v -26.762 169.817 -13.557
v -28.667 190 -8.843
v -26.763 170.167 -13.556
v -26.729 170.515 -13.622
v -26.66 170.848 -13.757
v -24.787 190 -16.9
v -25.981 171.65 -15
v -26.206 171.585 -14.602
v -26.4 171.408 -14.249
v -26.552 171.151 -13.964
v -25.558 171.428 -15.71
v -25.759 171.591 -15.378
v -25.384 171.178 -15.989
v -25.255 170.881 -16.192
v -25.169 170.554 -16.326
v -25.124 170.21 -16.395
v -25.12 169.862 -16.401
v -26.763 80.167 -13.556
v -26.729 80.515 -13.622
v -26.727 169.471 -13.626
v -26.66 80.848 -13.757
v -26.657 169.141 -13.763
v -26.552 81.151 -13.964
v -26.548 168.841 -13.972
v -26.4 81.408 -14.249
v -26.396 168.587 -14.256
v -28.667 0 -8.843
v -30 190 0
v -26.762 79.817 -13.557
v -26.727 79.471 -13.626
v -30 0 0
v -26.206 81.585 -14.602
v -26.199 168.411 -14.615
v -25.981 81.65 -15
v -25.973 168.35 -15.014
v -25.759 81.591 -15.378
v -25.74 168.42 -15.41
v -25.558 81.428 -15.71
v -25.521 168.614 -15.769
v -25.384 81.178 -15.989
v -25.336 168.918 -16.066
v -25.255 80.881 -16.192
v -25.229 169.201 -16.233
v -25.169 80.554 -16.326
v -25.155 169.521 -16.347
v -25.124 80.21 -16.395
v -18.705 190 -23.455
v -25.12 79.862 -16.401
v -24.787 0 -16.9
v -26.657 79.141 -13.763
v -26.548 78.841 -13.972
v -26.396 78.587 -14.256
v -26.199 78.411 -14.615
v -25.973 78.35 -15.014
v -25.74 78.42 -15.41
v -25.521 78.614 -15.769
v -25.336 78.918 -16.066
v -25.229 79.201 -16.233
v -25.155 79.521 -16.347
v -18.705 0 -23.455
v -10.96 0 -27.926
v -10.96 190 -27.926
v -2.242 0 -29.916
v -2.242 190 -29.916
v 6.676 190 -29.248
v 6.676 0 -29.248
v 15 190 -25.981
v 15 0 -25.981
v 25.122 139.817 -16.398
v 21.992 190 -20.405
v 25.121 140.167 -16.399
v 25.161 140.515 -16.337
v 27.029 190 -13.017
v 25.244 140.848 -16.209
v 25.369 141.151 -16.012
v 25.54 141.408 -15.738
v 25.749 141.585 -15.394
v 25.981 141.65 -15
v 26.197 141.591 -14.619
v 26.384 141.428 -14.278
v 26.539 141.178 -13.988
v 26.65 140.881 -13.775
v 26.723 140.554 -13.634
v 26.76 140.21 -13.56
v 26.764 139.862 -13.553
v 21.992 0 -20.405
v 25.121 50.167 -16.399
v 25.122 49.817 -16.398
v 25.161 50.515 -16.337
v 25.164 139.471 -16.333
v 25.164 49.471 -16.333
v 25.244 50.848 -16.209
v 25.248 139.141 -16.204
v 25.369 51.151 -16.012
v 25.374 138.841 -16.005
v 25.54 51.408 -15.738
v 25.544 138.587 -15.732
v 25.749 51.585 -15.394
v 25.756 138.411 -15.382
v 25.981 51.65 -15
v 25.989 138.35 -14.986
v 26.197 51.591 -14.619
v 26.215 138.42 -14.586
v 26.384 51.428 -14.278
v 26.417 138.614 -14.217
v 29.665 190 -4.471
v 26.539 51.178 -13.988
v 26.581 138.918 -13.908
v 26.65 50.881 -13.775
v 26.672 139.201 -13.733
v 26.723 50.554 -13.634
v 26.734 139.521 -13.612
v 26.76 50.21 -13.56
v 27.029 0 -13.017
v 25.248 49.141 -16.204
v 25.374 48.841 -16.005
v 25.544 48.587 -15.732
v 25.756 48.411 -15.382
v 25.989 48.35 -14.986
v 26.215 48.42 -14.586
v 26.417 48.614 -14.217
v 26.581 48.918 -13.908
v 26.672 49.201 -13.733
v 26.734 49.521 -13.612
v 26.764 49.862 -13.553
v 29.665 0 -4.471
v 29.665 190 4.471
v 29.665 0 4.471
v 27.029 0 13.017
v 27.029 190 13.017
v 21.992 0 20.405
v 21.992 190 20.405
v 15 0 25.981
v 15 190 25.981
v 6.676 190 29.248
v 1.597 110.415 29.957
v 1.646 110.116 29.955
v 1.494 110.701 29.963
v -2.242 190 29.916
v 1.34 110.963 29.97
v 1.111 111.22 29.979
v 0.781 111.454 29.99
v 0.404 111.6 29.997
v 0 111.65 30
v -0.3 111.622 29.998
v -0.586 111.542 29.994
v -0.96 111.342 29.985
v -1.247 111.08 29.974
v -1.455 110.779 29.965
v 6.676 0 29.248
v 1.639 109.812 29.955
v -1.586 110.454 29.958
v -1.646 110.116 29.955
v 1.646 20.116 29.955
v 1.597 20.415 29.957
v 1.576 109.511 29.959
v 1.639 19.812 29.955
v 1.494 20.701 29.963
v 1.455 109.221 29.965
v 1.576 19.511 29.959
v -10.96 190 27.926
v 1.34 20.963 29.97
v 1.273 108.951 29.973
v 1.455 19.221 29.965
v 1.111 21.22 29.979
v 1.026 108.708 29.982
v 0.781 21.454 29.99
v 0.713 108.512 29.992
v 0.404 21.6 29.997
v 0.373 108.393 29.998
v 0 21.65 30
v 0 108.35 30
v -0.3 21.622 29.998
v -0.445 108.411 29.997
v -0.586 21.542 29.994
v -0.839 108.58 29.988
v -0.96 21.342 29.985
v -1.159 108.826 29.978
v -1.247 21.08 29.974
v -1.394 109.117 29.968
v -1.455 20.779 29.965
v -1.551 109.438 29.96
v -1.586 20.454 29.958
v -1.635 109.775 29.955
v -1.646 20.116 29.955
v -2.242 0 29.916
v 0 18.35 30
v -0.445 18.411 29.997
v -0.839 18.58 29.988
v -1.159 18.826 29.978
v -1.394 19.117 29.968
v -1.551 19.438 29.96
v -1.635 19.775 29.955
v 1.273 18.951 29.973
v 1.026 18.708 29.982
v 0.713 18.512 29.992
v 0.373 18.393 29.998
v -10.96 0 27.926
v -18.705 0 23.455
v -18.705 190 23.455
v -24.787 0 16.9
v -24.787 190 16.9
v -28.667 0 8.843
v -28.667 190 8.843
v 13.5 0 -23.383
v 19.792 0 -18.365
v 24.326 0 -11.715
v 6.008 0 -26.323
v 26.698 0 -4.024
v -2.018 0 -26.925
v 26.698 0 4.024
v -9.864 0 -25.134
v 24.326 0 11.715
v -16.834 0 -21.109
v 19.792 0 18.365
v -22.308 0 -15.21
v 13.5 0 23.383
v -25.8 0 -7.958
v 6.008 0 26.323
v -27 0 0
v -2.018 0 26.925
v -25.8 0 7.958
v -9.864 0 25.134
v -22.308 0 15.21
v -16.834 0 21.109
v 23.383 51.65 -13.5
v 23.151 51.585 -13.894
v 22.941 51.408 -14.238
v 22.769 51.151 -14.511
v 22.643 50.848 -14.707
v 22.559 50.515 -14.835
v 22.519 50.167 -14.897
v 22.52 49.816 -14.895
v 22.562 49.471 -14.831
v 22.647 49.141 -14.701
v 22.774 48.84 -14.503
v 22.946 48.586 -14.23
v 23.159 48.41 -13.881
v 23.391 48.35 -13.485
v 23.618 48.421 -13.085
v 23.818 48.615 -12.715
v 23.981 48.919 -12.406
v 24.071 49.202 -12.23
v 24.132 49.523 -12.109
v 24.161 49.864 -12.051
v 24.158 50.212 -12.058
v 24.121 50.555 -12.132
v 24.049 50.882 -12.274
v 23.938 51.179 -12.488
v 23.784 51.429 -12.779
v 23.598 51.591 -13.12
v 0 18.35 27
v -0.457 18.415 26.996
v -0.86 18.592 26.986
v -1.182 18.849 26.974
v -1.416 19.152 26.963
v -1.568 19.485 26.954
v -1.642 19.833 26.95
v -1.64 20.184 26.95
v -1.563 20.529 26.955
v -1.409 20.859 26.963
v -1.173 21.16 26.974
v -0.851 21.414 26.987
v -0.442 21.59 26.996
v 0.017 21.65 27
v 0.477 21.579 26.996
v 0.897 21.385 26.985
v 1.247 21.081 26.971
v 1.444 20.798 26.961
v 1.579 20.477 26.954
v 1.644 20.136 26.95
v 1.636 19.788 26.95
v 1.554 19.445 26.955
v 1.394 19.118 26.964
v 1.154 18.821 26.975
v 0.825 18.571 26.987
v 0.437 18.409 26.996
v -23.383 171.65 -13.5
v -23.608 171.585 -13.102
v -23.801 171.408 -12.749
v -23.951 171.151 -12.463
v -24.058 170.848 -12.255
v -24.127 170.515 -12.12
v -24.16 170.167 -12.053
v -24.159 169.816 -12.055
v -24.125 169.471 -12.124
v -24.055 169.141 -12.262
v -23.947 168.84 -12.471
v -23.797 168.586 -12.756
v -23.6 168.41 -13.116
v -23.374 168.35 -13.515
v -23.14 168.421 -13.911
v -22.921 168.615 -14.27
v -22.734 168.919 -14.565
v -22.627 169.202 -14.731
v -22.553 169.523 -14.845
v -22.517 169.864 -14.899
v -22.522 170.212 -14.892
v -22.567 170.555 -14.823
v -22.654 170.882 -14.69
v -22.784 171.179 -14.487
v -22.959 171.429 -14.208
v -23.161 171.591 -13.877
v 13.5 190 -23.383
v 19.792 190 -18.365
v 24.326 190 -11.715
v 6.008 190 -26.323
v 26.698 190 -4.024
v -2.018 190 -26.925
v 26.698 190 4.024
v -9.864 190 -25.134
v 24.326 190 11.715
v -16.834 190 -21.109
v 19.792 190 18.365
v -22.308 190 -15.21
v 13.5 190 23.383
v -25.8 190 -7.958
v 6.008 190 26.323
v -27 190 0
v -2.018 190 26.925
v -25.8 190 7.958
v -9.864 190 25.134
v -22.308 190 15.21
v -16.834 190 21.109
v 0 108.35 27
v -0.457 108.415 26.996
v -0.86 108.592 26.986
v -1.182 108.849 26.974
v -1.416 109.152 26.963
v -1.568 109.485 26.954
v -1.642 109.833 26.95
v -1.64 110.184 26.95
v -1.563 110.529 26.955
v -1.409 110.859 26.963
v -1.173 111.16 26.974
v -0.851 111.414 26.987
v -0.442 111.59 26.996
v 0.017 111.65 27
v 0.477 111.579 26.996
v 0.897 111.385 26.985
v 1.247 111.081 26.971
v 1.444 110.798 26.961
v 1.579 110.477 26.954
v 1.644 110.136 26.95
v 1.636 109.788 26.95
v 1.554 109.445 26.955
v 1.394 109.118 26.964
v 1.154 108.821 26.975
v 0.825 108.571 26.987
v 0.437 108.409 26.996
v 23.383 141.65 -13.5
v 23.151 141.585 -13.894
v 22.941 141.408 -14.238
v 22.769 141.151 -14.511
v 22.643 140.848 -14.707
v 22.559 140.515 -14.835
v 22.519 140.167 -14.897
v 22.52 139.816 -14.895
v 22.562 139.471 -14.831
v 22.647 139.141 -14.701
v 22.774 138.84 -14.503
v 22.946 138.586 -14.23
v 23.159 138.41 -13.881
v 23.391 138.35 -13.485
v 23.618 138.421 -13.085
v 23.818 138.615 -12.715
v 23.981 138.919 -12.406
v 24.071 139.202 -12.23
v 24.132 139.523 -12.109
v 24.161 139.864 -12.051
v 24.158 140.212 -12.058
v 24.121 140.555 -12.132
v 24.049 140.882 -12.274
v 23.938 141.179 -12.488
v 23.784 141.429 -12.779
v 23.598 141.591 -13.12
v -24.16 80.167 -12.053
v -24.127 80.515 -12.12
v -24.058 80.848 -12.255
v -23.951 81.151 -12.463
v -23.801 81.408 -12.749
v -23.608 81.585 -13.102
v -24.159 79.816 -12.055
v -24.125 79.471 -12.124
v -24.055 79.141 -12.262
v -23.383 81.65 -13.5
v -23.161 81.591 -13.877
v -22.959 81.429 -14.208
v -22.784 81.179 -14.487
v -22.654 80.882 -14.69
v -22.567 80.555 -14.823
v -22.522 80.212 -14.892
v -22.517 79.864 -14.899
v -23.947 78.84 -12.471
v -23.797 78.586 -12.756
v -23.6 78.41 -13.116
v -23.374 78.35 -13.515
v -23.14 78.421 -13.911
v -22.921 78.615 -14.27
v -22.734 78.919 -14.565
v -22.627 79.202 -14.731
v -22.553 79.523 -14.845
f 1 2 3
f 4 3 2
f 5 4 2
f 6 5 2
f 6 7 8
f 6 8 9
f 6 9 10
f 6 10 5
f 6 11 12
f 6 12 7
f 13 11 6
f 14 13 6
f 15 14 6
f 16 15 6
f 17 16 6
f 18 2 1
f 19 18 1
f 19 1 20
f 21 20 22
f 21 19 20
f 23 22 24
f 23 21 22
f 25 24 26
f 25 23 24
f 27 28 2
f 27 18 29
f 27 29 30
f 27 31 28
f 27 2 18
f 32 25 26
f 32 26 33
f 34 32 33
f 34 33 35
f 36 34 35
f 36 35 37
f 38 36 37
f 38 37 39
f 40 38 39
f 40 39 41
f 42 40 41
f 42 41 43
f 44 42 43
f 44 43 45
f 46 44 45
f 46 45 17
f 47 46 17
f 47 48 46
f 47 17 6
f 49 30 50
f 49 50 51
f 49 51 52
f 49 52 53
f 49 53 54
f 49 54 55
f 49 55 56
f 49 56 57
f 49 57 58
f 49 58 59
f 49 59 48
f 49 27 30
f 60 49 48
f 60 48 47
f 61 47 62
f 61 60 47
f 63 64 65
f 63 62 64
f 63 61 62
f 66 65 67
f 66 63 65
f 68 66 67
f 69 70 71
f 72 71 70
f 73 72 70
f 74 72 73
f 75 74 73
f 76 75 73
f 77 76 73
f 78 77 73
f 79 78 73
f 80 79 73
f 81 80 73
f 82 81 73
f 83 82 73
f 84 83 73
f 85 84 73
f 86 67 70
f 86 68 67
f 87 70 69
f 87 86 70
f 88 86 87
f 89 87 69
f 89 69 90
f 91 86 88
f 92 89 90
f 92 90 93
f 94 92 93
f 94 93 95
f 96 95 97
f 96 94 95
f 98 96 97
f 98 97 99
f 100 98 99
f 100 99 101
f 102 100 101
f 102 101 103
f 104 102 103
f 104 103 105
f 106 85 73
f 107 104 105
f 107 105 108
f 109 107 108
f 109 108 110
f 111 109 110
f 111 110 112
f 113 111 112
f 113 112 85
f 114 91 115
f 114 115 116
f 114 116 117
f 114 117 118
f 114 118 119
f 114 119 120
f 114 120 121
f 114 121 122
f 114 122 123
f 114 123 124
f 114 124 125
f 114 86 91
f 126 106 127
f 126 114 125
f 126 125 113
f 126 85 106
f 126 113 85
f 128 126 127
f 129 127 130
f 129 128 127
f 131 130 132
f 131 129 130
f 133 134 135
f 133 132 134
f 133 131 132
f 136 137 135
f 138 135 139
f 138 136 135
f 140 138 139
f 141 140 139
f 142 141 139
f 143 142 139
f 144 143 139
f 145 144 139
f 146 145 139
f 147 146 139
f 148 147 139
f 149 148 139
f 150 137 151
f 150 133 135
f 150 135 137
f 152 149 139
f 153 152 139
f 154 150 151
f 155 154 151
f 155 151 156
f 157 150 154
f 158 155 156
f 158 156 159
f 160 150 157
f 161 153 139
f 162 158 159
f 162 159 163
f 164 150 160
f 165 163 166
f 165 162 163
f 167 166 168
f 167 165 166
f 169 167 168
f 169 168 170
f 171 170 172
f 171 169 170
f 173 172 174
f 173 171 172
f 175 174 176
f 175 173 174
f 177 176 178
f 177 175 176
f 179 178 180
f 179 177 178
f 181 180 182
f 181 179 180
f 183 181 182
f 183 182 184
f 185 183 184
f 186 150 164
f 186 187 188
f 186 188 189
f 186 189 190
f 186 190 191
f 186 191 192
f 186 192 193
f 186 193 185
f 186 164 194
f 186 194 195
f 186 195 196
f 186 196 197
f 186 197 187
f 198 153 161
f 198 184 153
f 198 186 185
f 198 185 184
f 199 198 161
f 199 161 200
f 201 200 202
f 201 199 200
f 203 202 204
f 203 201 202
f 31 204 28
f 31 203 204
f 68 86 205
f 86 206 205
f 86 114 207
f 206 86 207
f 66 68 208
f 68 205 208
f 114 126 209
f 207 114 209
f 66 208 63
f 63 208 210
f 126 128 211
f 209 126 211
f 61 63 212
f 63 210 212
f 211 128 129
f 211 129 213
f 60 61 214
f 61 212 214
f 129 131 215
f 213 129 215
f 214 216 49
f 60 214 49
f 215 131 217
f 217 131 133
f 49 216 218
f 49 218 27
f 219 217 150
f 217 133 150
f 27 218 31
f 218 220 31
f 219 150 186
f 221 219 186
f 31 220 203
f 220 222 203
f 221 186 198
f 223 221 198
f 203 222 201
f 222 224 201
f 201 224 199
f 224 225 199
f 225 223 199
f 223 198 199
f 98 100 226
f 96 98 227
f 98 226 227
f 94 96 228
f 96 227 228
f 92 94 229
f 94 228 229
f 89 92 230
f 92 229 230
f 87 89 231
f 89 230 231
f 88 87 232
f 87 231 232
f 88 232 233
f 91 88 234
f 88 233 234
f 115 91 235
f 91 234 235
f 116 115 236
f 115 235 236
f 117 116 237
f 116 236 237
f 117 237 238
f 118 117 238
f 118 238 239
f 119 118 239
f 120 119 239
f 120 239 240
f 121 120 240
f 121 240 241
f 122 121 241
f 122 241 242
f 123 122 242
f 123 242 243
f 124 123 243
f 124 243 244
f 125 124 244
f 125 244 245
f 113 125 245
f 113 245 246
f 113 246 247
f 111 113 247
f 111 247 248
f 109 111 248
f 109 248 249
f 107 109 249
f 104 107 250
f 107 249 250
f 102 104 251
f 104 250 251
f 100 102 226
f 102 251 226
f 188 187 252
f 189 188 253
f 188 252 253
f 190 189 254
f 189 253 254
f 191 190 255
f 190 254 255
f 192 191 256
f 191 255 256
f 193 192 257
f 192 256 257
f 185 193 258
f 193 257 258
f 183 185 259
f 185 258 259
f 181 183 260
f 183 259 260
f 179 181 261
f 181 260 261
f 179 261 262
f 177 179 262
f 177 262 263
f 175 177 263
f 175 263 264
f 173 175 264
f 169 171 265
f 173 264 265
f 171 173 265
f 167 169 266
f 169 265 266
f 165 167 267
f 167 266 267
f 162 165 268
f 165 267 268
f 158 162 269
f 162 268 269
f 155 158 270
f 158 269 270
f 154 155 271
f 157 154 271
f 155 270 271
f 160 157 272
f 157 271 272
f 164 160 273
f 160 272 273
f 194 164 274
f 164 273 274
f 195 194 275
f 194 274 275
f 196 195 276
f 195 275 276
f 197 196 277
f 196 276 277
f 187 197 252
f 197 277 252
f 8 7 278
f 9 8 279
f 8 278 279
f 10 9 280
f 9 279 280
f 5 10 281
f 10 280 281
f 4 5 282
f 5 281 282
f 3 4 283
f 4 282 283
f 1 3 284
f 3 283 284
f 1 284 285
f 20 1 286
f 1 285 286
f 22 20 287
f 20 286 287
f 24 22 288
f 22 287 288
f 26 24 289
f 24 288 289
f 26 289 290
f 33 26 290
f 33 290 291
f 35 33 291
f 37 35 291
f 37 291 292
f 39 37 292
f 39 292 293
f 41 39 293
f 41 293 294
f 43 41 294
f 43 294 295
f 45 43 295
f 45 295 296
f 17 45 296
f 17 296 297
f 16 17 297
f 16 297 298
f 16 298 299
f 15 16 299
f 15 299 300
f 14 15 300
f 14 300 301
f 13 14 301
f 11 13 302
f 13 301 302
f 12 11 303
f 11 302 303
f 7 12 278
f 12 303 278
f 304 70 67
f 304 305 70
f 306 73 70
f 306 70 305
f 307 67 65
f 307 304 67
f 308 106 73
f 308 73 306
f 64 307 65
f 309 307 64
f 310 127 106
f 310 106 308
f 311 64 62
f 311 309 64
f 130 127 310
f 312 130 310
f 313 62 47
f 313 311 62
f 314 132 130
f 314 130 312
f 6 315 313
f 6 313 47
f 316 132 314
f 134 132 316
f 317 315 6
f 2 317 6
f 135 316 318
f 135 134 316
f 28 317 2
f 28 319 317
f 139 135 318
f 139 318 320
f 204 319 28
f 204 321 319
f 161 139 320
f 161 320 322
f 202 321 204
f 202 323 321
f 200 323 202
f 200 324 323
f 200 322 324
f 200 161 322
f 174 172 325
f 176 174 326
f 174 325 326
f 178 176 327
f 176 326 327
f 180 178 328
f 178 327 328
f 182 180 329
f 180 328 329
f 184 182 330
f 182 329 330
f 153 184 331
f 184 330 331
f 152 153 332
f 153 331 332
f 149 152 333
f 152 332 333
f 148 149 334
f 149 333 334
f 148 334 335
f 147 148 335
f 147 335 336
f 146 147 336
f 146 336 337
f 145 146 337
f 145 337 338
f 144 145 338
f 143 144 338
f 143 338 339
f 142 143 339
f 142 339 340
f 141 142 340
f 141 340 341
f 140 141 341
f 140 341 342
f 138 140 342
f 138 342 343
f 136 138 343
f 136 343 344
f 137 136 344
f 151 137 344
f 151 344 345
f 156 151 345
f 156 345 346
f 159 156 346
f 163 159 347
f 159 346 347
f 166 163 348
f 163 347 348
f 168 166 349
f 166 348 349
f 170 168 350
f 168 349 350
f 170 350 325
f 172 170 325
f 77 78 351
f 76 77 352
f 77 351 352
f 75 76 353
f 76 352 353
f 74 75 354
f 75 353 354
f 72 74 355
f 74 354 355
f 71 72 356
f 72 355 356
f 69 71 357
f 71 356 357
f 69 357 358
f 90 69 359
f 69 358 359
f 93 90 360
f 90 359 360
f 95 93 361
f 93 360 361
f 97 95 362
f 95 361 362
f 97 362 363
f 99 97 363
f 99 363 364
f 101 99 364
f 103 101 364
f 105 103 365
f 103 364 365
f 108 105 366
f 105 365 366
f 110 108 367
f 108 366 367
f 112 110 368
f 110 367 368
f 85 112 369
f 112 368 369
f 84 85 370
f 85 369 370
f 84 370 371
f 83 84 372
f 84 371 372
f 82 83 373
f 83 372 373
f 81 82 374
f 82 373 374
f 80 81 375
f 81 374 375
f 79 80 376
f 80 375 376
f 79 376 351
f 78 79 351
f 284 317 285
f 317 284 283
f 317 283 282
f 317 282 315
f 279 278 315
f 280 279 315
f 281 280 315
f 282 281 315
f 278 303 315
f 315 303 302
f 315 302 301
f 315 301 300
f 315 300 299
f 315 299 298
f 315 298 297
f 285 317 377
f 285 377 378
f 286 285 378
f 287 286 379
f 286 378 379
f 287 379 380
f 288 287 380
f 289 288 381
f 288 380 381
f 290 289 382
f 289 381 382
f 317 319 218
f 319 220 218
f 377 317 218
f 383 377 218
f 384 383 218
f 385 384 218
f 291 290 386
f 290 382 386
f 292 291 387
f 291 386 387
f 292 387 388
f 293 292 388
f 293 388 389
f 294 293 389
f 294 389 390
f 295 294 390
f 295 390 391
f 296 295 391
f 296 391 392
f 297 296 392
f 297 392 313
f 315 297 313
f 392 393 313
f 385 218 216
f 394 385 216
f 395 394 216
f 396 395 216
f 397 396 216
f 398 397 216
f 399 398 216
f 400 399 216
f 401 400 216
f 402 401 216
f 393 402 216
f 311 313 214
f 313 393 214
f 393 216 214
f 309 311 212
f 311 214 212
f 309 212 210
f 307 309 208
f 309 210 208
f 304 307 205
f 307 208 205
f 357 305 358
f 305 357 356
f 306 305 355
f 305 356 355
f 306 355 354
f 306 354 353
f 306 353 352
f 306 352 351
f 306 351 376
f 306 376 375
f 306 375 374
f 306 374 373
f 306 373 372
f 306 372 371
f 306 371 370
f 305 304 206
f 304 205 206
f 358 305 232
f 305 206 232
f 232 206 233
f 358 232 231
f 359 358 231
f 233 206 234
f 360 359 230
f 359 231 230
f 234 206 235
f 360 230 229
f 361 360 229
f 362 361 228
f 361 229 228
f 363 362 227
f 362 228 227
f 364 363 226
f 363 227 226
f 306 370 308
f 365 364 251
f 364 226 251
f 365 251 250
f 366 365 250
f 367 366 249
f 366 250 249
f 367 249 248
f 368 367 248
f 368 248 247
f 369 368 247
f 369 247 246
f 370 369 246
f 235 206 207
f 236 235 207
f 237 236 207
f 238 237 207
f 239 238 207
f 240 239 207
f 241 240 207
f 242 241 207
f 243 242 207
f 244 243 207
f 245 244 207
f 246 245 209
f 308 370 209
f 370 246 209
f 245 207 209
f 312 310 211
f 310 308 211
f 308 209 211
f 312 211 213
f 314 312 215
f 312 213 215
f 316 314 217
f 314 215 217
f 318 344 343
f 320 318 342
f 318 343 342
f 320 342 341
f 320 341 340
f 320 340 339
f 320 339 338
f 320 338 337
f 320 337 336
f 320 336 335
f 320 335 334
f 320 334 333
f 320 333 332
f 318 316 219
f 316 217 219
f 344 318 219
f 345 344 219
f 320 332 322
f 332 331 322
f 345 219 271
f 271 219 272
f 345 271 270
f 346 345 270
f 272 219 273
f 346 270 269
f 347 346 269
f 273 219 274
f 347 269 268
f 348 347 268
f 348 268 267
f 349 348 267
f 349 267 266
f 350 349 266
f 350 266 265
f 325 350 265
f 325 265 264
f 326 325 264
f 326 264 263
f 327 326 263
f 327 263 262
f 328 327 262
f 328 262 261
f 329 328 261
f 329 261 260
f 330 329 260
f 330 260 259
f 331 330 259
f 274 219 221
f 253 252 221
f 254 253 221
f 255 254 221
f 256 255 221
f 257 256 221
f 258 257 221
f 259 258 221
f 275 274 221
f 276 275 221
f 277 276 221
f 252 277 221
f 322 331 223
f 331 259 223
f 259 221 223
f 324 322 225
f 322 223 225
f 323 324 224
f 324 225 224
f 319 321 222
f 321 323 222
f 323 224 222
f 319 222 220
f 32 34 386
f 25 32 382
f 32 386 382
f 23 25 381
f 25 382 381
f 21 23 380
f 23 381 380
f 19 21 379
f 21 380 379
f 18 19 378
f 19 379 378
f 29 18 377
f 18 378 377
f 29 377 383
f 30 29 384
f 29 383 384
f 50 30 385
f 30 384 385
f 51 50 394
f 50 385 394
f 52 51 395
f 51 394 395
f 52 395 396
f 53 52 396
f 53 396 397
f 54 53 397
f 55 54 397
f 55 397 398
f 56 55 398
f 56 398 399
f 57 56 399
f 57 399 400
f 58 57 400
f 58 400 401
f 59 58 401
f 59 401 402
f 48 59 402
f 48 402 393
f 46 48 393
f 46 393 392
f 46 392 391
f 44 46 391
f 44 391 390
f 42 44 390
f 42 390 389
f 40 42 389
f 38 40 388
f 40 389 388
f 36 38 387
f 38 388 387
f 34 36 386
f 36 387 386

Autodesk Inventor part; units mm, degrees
ref_plane "YZ Plane" through (0, 0, 0) normal (1, 0, 0) x (0, 1, 0)
ref_plane "XZ Plane" through (0, 0, 0) normal (0, 1, 0) x (-1, 0, 0)
ref_plane "XY Plane" through (0, 0, 0) normal (0, 0, 1) x (1, 0, 0)
sketch "Skizze1" plane through (0, 0, 0) normal (0, 1, 0) x (-1, 0, 0)
  circle A0 centre (0, 0) radius 27
  circle A1 centre (0, 0) radius 30
  dimension "d0" = 54
  dimension "d10" = 60
extrude "Extrusion1" add sketch "Skizze1" along normal blind 190
sketch "Skizze4" plane through (0, 0, 0) normal (0, -1, 0) x (1, 0, 0)
  circle A0 centre (0, 0) radius 30 projected
  point P0 (0, 30)
  point P1 (-25.9808, -15)
  point P2 (25.9808, -15)
  dimension "d11" = 30
  dimension "d14" = 360
ref_plane "Arbeitsebene2" through (0, 0, 30) normal (0, 0, 1) x (1, 0, 0)
ref_plane "Arbeitsebene3" through (25.9808, 0, -15) normal (0.866, 0, -0.5) x (0, 1, 0)
ref_plane "Arbeitsebene4" through (-25.9808, 0, -15) normal (-0.866, 0, -0.5) x (0, -1, 0)
sketch "Skizze5" plane through (25.9808, 0, -15) normal (0.866, 0, -0.5) x (0, 1, 0)
  line L0 (0, 30) -> (0, -30) projected
  line L1 (0, 30) -> (190, 30) projected
  point P0 (0, 0)
  point P1 (50, 0)
  point P2 (140, 0)
  dimension "d16" = 50
  dimension "d17" = 90
  dimension "d18" = 30
  dimension "d19" = 30
sketch "Skizze6" plane through (0, 0, 30) normal (0, 0, 1) x (1, 0, 0)
  line L0 (-30, 0) -> (-30, 190) projected
  line L1 (-30, 0) -> (30, 0) projected
  point P0 (0, 0)
  point P1 (0, 20)
  point P2 (0, 110)
  dimension "d20" = 90
  dimension "d21" = 30
  dimension "d22" = 30
  dimension "d23" = 20
sketch "Skizze7" plane through (-25.9808, 0, -15) normal (-0.866, 0, -0.5) x (0, -1, 0)
  line L0 (0, 30) -> (-190, 30) projected
  point P0 (0, 0)
  point P1 (-80, 0)
  point P2 (-170, 0)
  dimension "d24" = 30
  dimension "d25" = 80
  dimension "d47" = 90
  dimension "d48" = 30
hole "Bohrung1" at (-25.9808, 80, -15) at (-25.9808, 170, -15) direction (0.866, 0, 0.5) diameter 3.3 depth 8 tip angle 118
hole "Bohrung2" at (0, 110, 30) at (0, 20, 30) direction (0, 0, -1) diameter 3.3 depth 8 tip angle 118
hole "Bohrung3" at (25.9808, 50, -15) at (25.9808, 140, -15) direction (-0.866, 0, 0.5) diameter 3.3 depth 8 tip angle 118
properties part number "cylinder"
